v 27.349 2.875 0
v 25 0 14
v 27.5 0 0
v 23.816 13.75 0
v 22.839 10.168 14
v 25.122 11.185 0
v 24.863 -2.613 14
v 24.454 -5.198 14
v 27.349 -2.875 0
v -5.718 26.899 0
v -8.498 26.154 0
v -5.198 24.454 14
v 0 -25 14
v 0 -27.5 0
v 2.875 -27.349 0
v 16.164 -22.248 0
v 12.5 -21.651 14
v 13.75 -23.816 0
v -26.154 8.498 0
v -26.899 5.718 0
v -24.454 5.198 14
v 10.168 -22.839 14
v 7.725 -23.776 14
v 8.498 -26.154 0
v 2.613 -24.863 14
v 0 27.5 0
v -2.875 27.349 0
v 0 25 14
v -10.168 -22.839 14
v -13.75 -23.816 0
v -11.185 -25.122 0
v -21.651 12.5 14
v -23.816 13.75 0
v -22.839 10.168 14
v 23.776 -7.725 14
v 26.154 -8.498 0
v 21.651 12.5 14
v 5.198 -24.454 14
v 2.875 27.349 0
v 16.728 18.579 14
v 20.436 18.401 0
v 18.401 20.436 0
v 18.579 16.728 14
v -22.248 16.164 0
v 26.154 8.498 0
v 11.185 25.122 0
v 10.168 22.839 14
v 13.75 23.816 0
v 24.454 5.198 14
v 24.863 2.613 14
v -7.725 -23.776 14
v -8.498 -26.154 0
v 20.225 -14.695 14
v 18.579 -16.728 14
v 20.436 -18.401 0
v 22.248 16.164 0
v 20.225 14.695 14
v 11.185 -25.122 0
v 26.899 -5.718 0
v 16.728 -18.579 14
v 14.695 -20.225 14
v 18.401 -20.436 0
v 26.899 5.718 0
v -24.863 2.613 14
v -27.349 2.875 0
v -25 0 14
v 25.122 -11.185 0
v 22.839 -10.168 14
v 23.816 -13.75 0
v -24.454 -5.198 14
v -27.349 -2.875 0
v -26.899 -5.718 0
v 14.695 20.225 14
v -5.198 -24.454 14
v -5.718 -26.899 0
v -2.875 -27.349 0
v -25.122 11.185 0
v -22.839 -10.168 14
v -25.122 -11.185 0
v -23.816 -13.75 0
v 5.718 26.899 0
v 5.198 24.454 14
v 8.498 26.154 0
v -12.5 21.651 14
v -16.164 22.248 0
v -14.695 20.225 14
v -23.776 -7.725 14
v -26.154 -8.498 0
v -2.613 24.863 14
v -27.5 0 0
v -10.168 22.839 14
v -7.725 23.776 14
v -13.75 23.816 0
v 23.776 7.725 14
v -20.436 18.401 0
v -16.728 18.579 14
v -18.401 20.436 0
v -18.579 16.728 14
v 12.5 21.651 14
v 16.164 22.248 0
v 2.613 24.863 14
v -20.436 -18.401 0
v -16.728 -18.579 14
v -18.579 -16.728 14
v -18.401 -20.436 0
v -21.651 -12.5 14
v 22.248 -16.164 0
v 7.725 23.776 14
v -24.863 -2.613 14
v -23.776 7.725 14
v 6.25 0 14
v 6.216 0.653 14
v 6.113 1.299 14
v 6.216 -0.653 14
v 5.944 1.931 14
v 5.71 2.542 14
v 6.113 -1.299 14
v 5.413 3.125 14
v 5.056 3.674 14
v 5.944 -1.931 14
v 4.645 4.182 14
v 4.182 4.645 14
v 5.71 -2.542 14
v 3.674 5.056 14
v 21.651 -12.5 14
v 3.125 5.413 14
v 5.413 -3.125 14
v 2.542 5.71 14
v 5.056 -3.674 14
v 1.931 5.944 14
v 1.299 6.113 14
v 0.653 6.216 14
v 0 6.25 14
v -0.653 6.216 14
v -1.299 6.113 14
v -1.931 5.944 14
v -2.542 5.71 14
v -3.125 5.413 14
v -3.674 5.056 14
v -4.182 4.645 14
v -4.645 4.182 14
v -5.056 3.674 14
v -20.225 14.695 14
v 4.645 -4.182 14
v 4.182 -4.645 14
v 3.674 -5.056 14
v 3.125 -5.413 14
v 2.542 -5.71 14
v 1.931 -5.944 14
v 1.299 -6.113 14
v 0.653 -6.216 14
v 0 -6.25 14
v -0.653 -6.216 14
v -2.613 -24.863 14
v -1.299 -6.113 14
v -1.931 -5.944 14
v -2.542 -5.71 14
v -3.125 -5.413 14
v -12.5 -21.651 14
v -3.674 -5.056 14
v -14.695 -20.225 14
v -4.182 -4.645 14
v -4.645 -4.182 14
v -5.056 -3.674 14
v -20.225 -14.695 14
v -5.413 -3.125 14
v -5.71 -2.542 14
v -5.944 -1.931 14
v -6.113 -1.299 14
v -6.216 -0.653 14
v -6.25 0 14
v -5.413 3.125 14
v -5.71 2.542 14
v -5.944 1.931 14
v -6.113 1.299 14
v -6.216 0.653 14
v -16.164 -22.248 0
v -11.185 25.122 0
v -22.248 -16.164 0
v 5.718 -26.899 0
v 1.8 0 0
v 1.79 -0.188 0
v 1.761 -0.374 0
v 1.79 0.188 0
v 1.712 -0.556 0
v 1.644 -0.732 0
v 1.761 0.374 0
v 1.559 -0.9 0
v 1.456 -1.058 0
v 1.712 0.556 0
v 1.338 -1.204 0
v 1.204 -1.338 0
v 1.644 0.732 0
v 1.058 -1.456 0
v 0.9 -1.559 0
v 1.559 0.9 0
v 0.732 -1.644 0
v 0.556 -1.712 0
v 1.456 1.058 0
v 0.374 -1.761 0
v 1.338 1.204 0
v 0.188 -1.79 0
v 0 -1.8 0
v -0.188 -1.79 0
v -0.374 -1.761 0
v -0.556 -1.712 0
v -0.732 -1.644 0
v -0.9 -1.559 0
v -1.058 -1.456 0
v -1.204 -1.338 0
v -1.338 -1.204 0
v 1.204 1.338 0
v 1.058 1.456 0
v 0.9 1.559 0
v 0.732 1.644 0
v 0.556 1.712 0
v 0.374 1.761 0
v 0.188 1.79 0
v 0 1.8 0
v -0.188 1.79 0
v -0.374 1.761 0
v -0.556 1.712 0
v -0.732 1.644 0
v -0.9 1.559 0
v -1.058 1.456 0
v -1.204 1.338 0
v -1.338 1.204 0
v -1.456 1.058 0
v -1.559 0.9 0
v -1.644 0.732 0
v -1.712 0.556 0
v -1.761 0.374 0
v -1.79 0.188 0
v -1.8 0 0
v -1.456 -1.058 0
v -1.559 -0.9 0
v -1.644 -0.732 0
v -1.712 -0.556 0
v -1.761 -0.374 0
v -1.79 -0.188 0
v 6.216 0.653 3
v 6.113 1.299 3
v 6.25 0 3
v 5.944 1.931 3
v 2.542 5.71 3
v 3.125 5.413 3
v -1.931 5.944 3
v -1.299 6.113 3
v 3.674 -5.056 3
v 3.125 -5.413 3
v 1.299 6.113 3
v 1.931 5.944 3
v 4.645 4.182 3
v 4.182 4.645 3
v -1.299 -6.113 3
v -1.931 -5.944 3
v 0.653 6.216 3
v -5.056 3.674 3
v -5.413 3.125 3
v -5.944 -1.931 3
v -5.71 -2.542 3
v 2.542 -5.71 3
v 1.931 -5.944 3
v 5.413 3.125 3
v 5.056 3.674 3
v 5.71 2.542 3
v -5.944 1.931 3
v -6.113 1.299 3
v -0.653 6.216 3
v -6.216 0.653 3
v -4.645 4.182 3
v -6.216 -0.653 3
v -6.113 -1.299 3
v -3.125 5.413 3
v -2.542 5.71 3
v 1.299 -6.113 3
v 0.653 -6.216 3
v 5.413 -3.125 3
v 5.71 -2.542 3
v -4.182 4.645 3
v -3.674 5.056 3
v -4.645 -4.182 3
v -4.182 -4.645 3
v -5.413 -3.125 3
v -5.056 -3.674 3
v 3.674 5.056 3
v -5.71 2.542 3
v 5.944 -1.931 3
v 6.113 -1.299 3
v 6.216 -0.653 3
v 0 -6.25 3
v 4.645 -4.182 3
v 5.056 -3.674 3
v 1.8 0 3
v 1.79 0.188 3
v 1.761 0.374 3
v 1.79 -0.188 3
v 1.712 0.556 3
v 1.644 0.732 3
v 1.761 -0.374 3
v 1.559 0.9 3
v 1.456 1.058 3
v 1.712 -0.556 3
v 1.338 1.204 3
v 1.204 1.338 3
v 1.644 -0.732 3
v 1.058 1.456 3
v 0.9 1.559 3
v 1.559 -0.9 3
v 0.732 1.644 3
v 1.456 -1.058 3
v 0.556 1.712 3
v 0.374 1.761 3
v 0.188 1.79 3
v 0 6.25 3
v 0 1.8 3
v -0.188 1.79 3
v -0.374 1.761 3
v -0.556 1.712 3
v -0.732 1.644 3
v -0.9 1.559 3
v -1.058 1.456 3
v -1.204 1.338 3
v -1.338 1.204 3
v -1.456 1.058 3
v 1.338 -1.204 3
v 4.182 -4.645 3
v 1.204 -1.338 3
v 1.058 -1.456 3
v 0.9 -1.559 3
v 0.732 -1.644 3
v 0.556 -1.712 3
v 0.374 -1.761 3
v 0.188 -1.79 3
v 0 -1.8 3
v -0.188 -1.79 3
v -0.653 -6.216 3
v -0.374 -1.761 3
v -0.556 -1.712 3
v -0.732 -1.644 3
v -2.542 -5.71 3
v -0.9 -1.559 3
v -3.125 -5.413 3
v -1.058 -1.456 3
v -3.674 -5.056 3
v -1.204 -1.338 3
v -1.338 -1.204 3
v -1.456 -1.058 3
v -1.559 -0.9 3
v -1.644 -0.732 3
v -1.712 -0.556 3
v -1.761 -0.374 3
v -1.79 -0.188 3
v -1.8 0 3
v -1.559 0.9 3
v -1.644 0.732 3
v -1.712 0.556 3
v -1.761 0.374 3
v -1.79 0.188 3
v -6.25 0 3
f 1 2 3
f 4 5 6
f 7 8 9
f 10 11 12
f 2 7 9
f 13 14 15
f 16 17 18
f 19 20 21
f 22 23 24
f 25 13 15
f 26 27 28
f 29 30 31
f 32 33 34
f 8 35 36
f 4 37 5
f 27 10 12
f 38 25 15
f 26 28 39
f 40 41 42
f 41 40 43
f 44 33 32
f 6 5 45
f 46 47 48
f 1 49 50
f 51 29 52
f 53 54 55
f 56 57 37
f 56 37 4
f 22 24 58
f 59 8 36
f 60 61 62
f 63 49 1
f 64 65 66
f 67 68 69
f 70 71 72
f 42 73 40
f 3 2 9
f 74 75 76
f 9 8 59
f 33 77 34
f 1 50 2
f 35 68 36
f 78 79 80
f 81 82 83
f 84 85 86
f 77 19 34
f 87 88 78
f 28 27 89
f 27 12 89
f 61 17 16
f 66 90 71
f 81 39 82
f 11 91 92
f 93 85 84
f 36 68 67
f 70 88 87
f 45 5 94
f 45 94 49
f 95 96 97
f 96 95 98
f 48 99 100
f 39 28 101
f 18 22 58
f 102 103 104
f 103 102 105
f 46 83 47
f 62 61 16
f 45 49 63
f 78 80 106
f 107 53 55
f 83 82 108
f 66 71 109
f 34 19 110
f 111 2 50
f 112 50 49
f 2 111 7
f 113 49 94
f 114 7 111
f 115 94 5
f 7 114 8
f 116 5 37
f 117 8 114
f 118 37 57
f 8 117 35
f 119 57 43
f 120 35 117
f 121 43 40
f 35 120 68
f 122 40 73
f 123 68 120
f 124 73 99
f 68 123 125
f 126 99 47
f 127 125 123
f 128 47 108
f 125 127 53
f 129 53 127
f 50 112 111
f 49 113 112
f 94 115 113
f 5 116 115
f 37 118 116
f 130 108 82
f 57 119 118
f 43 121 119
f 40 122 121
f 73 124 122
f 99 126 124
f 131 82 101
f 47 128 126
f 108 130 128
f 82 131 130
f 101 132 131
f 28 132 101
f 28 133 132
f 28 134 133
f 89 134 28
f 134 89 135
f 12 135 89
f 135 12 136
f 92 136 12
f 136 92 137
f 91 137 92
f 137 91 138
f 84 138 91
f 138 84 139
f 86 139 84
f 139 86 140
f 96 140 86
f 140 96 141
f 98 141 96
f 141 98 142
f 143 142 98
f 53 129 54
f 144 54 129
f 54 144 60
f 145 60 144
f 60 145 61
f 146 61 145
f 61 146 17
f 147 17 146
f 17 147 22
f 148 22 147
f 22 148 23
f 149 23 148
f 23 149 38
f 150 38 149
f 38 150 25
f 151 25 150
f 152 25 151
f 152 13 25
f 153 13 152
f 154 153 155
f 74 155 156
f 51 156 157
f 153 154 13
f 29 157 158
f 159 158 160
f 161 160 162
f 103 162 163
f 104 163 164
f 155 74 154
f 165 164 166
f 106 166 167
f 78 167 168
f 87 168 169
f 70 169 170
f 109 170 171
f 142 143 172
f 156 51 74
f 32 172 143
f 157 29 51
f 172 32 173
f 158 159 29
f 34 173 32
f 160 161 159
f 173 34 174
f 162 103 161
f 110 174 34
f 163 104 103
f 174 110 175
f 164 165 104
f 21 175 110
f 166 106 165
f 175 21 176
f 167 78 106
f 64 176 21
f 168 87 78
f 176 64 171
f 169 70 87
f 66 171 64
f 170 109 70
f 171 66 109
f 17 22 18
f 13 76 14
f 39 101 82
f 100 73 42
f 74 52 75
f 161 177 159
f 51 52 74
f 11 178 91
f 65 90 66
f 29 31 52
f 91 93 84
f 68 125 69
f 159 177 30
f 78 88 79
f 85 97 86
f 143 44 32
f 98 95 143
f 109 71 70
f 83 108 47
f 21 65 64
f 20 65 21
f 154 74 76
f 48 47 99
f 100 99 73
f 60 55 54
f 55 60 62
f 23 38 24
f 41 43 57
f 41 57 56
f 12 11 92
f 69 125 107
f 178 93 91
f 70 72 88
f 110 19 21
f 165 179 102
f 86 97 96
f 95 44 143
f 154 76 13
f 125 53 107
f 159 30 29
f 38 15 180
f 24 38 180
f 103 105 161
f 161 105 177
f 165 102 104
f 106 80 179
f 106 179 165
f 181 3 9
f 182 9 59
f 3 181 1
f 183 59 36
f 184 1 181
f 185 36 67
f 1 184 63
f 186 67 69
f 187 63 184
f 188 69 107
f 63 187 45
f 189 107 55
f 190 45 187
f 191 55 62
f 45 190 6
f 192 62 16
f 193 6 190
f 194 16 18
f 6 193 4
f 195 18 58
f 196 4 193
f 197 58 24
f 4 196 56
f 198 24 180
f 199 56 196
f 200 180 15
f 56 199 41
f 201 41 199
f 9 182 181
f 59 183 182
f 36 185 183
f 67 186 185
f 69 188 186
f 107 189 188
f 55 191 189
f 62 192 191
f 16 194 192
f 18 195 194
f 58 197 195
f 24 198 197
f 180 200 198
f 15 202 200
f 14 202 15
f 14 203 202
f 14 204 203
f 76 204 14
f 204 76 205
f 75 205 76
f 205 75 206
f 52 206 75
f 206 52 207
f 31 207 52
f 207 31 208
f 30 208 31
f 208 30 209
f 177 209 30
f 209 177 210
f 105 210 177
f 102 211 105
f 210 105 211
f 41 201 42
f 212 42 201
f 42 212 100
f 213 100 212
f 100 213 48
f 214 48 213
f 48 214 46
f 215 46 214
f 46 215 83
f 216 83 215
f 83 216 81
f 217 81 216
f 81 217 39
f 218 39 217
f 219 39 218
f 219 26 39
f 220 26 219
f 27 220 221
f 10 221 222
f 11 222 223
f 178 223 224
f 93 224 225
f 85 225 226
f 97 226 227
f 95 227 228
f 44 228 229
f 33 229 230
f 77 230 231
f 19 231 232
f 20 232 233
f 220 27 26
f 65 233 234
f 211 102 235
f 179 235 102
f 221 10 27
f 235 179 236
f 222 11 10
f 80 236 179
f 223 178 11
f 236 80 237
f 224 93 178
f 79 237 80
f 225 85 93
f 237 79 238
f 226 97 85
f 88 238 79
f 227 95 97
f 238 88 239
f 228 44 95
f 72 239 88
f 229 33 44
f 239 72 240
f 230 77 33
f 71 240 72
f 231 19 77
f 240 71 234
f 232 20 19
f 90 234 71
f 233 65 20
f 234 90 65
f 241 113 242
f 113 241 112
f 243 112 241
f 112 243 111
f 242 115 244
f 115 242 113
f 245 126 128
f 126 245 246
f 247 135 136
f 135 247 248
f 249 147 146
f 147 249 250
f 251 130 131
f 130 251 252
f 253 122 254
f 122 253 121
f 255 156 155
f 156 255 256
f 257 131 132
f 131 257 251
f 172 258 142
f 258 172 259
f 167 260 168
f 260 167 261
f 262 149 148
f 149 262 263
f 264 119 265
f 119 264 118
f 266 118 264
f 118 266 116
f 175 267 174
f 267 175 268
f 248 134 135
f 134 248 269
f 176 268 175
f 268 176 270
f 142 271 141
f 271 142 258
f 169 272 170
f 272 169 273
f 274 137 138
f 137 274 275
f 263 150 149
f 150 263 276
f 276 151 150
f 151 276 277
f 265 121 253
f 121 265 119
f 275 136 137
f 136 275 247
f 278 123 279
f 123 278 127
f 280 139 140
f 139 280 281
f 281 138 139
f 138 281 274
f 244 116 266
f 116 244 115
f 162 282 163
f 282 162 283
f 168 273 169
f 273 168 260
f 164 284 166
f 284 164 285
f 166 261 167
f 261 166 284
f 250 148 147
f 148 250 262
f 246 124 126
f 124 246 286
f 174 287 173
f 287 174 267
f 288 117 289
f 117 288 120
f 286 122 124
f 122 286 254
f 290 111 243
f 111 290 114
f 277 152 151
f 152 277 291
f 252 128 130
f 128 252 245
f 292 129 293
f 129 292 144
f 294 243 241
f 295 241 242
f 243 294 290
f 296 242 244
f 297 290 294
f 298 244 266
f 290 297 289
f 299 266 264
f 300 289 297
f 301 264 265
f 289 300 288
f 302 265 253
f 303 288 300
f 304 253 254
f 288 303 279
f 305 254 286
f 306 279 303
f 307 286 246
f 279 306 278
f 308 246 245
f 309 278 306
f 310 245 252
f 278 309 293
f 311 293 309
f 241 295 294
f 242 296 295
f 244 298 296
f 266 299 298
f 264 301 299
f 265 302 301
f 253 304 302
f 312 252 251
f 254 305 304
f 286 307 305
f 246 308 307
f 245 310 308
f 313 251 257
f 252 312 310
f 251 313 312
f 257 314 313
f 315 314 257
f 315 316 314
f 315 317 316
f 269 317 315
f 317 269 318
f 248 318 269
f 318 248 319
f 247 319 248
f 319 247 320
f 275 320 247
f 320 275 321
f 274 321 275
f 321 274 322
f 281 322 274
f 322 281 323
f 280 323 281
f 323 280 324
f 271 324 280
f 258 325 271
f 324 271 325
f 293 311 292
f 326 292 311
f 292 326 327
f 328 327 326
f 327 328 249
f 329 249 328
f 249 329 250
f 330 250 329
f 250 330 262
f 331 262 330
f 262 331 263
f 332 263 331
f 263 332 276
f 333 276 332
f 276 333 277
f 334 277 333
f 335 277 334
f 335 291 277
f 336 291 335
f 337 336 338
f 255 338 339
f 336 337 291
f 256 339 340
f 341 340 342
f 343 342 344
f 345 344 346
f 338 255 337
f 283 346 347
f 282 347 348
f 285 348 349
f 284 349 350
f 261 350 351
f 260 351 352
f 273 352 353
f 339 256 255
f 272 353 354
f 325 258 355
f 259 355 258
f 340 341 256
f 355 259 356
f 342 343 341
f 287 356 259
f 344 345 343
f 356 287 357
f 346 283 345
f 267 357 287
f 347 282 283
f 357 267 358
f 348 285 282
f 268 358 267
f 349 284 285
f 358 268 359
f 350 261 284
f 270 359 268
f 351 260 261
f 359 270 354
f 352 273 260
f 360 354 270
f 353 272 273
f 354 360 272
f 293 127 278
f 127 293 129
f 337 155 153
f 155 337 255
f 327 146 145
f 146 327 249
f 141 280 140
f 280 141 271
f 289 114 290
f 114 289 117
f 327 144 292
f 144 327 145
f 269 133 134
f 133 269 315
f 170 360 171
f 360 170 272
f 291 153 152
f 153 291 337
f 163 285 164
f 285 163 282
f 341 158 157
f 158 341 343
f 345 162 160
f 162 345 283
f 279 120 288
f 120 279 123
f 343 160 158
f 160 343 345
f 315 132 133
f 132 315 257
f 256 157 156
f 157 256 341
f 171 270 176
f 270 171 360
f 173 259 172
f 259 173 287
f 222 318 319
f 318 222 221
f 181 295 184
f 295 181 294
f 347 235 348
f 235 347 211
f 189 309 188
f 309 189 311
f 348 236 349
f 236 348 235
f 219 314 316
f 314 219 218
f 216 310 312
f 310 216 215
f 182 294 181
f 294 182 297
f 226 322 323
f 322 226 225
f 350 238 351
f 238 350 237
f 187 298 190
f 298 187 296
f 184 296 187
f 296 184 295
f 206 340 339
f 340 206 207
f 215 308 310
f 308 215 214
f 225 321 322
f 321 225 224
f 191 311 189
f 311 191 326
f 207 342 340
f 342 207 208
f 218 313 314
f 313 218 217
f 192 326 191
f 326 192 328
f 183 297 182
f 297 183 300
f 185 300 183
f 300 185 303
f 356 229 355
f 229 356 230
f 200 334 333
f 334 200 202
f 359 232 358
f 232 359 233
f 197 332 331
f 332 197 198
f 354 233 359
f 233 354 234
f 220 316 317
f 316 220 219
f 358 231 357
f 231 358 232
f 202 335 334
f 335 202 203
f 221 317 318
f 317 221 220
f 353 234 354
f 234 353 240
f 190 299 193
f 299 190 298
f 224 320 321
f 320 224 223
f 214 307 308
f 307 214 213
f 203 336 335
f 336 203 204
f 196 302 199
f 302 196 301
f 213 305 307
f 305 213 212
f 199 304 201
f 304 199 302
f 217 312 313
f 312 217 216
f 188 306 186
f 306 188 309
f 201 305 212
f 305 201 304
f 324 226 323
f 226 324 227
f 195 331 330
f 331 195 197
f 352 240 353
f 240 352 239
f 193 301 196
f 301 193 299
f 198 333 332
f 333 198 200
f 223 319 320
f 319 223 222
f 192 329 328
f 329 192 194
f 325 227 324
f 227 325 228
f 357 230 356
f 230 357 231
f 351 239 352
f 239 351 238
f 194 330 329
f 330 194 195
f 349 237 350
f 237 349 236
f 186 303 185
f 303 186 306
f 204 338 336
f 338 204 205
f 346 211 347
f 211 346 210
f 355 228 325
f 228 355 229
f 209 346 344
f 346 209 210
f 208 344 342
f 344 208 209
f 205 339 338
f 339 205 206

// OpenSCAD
// Customizer Foot Designer
// Copyright (c) 2016 www.DIY3DTech.com
//
// REV 2.0 04/02/2016

// Standard Thingiverse Configurations:
// Range = [:] Slider
// Range = [,] Drop Down Box
// Range = None Text Box


// Start Parameters for for Customizer ----
// preview[view:south, tilt:top]

// of Foot (mm)
Height = 14; //[5:1:100]

// Diameter (mm)
Base = 55; //[10:1:100]

// Contact Diameter (mm)
Top = 50; //[5:1:100]

// (Count)
Sides = 60; //[4:1:100]

// Diameter (% of Contact Diameter)
Offset_Percent = 25; //[5:1:100]

//  (mm)
Offset_Thickness = 3; //[1:1:10]

// Diameter (mm)
Screw = 3.6; //[1:1:10]

// End Parameters for for Customizer  ----

// Start Module
Foot();

module Foot(){
difference() {
// Create Base
cylinder( Height, Base/2, Top/2,$fn=Sides, false);
    
// Create Offset Opening
translate([0,0,Offset_Thickness]){
cylinder( (Height+2), ((Top/2)*(Offset_Percent/100)), ((Top/2)*(Offset_Percent/100)),$fn=60, false);
    }
    
// Create Screw Opening   
translate([0,0,-1]){
cylinder( Height+5, Screw/2, Screw/2,$fn=60, false);
    }
}   
}
